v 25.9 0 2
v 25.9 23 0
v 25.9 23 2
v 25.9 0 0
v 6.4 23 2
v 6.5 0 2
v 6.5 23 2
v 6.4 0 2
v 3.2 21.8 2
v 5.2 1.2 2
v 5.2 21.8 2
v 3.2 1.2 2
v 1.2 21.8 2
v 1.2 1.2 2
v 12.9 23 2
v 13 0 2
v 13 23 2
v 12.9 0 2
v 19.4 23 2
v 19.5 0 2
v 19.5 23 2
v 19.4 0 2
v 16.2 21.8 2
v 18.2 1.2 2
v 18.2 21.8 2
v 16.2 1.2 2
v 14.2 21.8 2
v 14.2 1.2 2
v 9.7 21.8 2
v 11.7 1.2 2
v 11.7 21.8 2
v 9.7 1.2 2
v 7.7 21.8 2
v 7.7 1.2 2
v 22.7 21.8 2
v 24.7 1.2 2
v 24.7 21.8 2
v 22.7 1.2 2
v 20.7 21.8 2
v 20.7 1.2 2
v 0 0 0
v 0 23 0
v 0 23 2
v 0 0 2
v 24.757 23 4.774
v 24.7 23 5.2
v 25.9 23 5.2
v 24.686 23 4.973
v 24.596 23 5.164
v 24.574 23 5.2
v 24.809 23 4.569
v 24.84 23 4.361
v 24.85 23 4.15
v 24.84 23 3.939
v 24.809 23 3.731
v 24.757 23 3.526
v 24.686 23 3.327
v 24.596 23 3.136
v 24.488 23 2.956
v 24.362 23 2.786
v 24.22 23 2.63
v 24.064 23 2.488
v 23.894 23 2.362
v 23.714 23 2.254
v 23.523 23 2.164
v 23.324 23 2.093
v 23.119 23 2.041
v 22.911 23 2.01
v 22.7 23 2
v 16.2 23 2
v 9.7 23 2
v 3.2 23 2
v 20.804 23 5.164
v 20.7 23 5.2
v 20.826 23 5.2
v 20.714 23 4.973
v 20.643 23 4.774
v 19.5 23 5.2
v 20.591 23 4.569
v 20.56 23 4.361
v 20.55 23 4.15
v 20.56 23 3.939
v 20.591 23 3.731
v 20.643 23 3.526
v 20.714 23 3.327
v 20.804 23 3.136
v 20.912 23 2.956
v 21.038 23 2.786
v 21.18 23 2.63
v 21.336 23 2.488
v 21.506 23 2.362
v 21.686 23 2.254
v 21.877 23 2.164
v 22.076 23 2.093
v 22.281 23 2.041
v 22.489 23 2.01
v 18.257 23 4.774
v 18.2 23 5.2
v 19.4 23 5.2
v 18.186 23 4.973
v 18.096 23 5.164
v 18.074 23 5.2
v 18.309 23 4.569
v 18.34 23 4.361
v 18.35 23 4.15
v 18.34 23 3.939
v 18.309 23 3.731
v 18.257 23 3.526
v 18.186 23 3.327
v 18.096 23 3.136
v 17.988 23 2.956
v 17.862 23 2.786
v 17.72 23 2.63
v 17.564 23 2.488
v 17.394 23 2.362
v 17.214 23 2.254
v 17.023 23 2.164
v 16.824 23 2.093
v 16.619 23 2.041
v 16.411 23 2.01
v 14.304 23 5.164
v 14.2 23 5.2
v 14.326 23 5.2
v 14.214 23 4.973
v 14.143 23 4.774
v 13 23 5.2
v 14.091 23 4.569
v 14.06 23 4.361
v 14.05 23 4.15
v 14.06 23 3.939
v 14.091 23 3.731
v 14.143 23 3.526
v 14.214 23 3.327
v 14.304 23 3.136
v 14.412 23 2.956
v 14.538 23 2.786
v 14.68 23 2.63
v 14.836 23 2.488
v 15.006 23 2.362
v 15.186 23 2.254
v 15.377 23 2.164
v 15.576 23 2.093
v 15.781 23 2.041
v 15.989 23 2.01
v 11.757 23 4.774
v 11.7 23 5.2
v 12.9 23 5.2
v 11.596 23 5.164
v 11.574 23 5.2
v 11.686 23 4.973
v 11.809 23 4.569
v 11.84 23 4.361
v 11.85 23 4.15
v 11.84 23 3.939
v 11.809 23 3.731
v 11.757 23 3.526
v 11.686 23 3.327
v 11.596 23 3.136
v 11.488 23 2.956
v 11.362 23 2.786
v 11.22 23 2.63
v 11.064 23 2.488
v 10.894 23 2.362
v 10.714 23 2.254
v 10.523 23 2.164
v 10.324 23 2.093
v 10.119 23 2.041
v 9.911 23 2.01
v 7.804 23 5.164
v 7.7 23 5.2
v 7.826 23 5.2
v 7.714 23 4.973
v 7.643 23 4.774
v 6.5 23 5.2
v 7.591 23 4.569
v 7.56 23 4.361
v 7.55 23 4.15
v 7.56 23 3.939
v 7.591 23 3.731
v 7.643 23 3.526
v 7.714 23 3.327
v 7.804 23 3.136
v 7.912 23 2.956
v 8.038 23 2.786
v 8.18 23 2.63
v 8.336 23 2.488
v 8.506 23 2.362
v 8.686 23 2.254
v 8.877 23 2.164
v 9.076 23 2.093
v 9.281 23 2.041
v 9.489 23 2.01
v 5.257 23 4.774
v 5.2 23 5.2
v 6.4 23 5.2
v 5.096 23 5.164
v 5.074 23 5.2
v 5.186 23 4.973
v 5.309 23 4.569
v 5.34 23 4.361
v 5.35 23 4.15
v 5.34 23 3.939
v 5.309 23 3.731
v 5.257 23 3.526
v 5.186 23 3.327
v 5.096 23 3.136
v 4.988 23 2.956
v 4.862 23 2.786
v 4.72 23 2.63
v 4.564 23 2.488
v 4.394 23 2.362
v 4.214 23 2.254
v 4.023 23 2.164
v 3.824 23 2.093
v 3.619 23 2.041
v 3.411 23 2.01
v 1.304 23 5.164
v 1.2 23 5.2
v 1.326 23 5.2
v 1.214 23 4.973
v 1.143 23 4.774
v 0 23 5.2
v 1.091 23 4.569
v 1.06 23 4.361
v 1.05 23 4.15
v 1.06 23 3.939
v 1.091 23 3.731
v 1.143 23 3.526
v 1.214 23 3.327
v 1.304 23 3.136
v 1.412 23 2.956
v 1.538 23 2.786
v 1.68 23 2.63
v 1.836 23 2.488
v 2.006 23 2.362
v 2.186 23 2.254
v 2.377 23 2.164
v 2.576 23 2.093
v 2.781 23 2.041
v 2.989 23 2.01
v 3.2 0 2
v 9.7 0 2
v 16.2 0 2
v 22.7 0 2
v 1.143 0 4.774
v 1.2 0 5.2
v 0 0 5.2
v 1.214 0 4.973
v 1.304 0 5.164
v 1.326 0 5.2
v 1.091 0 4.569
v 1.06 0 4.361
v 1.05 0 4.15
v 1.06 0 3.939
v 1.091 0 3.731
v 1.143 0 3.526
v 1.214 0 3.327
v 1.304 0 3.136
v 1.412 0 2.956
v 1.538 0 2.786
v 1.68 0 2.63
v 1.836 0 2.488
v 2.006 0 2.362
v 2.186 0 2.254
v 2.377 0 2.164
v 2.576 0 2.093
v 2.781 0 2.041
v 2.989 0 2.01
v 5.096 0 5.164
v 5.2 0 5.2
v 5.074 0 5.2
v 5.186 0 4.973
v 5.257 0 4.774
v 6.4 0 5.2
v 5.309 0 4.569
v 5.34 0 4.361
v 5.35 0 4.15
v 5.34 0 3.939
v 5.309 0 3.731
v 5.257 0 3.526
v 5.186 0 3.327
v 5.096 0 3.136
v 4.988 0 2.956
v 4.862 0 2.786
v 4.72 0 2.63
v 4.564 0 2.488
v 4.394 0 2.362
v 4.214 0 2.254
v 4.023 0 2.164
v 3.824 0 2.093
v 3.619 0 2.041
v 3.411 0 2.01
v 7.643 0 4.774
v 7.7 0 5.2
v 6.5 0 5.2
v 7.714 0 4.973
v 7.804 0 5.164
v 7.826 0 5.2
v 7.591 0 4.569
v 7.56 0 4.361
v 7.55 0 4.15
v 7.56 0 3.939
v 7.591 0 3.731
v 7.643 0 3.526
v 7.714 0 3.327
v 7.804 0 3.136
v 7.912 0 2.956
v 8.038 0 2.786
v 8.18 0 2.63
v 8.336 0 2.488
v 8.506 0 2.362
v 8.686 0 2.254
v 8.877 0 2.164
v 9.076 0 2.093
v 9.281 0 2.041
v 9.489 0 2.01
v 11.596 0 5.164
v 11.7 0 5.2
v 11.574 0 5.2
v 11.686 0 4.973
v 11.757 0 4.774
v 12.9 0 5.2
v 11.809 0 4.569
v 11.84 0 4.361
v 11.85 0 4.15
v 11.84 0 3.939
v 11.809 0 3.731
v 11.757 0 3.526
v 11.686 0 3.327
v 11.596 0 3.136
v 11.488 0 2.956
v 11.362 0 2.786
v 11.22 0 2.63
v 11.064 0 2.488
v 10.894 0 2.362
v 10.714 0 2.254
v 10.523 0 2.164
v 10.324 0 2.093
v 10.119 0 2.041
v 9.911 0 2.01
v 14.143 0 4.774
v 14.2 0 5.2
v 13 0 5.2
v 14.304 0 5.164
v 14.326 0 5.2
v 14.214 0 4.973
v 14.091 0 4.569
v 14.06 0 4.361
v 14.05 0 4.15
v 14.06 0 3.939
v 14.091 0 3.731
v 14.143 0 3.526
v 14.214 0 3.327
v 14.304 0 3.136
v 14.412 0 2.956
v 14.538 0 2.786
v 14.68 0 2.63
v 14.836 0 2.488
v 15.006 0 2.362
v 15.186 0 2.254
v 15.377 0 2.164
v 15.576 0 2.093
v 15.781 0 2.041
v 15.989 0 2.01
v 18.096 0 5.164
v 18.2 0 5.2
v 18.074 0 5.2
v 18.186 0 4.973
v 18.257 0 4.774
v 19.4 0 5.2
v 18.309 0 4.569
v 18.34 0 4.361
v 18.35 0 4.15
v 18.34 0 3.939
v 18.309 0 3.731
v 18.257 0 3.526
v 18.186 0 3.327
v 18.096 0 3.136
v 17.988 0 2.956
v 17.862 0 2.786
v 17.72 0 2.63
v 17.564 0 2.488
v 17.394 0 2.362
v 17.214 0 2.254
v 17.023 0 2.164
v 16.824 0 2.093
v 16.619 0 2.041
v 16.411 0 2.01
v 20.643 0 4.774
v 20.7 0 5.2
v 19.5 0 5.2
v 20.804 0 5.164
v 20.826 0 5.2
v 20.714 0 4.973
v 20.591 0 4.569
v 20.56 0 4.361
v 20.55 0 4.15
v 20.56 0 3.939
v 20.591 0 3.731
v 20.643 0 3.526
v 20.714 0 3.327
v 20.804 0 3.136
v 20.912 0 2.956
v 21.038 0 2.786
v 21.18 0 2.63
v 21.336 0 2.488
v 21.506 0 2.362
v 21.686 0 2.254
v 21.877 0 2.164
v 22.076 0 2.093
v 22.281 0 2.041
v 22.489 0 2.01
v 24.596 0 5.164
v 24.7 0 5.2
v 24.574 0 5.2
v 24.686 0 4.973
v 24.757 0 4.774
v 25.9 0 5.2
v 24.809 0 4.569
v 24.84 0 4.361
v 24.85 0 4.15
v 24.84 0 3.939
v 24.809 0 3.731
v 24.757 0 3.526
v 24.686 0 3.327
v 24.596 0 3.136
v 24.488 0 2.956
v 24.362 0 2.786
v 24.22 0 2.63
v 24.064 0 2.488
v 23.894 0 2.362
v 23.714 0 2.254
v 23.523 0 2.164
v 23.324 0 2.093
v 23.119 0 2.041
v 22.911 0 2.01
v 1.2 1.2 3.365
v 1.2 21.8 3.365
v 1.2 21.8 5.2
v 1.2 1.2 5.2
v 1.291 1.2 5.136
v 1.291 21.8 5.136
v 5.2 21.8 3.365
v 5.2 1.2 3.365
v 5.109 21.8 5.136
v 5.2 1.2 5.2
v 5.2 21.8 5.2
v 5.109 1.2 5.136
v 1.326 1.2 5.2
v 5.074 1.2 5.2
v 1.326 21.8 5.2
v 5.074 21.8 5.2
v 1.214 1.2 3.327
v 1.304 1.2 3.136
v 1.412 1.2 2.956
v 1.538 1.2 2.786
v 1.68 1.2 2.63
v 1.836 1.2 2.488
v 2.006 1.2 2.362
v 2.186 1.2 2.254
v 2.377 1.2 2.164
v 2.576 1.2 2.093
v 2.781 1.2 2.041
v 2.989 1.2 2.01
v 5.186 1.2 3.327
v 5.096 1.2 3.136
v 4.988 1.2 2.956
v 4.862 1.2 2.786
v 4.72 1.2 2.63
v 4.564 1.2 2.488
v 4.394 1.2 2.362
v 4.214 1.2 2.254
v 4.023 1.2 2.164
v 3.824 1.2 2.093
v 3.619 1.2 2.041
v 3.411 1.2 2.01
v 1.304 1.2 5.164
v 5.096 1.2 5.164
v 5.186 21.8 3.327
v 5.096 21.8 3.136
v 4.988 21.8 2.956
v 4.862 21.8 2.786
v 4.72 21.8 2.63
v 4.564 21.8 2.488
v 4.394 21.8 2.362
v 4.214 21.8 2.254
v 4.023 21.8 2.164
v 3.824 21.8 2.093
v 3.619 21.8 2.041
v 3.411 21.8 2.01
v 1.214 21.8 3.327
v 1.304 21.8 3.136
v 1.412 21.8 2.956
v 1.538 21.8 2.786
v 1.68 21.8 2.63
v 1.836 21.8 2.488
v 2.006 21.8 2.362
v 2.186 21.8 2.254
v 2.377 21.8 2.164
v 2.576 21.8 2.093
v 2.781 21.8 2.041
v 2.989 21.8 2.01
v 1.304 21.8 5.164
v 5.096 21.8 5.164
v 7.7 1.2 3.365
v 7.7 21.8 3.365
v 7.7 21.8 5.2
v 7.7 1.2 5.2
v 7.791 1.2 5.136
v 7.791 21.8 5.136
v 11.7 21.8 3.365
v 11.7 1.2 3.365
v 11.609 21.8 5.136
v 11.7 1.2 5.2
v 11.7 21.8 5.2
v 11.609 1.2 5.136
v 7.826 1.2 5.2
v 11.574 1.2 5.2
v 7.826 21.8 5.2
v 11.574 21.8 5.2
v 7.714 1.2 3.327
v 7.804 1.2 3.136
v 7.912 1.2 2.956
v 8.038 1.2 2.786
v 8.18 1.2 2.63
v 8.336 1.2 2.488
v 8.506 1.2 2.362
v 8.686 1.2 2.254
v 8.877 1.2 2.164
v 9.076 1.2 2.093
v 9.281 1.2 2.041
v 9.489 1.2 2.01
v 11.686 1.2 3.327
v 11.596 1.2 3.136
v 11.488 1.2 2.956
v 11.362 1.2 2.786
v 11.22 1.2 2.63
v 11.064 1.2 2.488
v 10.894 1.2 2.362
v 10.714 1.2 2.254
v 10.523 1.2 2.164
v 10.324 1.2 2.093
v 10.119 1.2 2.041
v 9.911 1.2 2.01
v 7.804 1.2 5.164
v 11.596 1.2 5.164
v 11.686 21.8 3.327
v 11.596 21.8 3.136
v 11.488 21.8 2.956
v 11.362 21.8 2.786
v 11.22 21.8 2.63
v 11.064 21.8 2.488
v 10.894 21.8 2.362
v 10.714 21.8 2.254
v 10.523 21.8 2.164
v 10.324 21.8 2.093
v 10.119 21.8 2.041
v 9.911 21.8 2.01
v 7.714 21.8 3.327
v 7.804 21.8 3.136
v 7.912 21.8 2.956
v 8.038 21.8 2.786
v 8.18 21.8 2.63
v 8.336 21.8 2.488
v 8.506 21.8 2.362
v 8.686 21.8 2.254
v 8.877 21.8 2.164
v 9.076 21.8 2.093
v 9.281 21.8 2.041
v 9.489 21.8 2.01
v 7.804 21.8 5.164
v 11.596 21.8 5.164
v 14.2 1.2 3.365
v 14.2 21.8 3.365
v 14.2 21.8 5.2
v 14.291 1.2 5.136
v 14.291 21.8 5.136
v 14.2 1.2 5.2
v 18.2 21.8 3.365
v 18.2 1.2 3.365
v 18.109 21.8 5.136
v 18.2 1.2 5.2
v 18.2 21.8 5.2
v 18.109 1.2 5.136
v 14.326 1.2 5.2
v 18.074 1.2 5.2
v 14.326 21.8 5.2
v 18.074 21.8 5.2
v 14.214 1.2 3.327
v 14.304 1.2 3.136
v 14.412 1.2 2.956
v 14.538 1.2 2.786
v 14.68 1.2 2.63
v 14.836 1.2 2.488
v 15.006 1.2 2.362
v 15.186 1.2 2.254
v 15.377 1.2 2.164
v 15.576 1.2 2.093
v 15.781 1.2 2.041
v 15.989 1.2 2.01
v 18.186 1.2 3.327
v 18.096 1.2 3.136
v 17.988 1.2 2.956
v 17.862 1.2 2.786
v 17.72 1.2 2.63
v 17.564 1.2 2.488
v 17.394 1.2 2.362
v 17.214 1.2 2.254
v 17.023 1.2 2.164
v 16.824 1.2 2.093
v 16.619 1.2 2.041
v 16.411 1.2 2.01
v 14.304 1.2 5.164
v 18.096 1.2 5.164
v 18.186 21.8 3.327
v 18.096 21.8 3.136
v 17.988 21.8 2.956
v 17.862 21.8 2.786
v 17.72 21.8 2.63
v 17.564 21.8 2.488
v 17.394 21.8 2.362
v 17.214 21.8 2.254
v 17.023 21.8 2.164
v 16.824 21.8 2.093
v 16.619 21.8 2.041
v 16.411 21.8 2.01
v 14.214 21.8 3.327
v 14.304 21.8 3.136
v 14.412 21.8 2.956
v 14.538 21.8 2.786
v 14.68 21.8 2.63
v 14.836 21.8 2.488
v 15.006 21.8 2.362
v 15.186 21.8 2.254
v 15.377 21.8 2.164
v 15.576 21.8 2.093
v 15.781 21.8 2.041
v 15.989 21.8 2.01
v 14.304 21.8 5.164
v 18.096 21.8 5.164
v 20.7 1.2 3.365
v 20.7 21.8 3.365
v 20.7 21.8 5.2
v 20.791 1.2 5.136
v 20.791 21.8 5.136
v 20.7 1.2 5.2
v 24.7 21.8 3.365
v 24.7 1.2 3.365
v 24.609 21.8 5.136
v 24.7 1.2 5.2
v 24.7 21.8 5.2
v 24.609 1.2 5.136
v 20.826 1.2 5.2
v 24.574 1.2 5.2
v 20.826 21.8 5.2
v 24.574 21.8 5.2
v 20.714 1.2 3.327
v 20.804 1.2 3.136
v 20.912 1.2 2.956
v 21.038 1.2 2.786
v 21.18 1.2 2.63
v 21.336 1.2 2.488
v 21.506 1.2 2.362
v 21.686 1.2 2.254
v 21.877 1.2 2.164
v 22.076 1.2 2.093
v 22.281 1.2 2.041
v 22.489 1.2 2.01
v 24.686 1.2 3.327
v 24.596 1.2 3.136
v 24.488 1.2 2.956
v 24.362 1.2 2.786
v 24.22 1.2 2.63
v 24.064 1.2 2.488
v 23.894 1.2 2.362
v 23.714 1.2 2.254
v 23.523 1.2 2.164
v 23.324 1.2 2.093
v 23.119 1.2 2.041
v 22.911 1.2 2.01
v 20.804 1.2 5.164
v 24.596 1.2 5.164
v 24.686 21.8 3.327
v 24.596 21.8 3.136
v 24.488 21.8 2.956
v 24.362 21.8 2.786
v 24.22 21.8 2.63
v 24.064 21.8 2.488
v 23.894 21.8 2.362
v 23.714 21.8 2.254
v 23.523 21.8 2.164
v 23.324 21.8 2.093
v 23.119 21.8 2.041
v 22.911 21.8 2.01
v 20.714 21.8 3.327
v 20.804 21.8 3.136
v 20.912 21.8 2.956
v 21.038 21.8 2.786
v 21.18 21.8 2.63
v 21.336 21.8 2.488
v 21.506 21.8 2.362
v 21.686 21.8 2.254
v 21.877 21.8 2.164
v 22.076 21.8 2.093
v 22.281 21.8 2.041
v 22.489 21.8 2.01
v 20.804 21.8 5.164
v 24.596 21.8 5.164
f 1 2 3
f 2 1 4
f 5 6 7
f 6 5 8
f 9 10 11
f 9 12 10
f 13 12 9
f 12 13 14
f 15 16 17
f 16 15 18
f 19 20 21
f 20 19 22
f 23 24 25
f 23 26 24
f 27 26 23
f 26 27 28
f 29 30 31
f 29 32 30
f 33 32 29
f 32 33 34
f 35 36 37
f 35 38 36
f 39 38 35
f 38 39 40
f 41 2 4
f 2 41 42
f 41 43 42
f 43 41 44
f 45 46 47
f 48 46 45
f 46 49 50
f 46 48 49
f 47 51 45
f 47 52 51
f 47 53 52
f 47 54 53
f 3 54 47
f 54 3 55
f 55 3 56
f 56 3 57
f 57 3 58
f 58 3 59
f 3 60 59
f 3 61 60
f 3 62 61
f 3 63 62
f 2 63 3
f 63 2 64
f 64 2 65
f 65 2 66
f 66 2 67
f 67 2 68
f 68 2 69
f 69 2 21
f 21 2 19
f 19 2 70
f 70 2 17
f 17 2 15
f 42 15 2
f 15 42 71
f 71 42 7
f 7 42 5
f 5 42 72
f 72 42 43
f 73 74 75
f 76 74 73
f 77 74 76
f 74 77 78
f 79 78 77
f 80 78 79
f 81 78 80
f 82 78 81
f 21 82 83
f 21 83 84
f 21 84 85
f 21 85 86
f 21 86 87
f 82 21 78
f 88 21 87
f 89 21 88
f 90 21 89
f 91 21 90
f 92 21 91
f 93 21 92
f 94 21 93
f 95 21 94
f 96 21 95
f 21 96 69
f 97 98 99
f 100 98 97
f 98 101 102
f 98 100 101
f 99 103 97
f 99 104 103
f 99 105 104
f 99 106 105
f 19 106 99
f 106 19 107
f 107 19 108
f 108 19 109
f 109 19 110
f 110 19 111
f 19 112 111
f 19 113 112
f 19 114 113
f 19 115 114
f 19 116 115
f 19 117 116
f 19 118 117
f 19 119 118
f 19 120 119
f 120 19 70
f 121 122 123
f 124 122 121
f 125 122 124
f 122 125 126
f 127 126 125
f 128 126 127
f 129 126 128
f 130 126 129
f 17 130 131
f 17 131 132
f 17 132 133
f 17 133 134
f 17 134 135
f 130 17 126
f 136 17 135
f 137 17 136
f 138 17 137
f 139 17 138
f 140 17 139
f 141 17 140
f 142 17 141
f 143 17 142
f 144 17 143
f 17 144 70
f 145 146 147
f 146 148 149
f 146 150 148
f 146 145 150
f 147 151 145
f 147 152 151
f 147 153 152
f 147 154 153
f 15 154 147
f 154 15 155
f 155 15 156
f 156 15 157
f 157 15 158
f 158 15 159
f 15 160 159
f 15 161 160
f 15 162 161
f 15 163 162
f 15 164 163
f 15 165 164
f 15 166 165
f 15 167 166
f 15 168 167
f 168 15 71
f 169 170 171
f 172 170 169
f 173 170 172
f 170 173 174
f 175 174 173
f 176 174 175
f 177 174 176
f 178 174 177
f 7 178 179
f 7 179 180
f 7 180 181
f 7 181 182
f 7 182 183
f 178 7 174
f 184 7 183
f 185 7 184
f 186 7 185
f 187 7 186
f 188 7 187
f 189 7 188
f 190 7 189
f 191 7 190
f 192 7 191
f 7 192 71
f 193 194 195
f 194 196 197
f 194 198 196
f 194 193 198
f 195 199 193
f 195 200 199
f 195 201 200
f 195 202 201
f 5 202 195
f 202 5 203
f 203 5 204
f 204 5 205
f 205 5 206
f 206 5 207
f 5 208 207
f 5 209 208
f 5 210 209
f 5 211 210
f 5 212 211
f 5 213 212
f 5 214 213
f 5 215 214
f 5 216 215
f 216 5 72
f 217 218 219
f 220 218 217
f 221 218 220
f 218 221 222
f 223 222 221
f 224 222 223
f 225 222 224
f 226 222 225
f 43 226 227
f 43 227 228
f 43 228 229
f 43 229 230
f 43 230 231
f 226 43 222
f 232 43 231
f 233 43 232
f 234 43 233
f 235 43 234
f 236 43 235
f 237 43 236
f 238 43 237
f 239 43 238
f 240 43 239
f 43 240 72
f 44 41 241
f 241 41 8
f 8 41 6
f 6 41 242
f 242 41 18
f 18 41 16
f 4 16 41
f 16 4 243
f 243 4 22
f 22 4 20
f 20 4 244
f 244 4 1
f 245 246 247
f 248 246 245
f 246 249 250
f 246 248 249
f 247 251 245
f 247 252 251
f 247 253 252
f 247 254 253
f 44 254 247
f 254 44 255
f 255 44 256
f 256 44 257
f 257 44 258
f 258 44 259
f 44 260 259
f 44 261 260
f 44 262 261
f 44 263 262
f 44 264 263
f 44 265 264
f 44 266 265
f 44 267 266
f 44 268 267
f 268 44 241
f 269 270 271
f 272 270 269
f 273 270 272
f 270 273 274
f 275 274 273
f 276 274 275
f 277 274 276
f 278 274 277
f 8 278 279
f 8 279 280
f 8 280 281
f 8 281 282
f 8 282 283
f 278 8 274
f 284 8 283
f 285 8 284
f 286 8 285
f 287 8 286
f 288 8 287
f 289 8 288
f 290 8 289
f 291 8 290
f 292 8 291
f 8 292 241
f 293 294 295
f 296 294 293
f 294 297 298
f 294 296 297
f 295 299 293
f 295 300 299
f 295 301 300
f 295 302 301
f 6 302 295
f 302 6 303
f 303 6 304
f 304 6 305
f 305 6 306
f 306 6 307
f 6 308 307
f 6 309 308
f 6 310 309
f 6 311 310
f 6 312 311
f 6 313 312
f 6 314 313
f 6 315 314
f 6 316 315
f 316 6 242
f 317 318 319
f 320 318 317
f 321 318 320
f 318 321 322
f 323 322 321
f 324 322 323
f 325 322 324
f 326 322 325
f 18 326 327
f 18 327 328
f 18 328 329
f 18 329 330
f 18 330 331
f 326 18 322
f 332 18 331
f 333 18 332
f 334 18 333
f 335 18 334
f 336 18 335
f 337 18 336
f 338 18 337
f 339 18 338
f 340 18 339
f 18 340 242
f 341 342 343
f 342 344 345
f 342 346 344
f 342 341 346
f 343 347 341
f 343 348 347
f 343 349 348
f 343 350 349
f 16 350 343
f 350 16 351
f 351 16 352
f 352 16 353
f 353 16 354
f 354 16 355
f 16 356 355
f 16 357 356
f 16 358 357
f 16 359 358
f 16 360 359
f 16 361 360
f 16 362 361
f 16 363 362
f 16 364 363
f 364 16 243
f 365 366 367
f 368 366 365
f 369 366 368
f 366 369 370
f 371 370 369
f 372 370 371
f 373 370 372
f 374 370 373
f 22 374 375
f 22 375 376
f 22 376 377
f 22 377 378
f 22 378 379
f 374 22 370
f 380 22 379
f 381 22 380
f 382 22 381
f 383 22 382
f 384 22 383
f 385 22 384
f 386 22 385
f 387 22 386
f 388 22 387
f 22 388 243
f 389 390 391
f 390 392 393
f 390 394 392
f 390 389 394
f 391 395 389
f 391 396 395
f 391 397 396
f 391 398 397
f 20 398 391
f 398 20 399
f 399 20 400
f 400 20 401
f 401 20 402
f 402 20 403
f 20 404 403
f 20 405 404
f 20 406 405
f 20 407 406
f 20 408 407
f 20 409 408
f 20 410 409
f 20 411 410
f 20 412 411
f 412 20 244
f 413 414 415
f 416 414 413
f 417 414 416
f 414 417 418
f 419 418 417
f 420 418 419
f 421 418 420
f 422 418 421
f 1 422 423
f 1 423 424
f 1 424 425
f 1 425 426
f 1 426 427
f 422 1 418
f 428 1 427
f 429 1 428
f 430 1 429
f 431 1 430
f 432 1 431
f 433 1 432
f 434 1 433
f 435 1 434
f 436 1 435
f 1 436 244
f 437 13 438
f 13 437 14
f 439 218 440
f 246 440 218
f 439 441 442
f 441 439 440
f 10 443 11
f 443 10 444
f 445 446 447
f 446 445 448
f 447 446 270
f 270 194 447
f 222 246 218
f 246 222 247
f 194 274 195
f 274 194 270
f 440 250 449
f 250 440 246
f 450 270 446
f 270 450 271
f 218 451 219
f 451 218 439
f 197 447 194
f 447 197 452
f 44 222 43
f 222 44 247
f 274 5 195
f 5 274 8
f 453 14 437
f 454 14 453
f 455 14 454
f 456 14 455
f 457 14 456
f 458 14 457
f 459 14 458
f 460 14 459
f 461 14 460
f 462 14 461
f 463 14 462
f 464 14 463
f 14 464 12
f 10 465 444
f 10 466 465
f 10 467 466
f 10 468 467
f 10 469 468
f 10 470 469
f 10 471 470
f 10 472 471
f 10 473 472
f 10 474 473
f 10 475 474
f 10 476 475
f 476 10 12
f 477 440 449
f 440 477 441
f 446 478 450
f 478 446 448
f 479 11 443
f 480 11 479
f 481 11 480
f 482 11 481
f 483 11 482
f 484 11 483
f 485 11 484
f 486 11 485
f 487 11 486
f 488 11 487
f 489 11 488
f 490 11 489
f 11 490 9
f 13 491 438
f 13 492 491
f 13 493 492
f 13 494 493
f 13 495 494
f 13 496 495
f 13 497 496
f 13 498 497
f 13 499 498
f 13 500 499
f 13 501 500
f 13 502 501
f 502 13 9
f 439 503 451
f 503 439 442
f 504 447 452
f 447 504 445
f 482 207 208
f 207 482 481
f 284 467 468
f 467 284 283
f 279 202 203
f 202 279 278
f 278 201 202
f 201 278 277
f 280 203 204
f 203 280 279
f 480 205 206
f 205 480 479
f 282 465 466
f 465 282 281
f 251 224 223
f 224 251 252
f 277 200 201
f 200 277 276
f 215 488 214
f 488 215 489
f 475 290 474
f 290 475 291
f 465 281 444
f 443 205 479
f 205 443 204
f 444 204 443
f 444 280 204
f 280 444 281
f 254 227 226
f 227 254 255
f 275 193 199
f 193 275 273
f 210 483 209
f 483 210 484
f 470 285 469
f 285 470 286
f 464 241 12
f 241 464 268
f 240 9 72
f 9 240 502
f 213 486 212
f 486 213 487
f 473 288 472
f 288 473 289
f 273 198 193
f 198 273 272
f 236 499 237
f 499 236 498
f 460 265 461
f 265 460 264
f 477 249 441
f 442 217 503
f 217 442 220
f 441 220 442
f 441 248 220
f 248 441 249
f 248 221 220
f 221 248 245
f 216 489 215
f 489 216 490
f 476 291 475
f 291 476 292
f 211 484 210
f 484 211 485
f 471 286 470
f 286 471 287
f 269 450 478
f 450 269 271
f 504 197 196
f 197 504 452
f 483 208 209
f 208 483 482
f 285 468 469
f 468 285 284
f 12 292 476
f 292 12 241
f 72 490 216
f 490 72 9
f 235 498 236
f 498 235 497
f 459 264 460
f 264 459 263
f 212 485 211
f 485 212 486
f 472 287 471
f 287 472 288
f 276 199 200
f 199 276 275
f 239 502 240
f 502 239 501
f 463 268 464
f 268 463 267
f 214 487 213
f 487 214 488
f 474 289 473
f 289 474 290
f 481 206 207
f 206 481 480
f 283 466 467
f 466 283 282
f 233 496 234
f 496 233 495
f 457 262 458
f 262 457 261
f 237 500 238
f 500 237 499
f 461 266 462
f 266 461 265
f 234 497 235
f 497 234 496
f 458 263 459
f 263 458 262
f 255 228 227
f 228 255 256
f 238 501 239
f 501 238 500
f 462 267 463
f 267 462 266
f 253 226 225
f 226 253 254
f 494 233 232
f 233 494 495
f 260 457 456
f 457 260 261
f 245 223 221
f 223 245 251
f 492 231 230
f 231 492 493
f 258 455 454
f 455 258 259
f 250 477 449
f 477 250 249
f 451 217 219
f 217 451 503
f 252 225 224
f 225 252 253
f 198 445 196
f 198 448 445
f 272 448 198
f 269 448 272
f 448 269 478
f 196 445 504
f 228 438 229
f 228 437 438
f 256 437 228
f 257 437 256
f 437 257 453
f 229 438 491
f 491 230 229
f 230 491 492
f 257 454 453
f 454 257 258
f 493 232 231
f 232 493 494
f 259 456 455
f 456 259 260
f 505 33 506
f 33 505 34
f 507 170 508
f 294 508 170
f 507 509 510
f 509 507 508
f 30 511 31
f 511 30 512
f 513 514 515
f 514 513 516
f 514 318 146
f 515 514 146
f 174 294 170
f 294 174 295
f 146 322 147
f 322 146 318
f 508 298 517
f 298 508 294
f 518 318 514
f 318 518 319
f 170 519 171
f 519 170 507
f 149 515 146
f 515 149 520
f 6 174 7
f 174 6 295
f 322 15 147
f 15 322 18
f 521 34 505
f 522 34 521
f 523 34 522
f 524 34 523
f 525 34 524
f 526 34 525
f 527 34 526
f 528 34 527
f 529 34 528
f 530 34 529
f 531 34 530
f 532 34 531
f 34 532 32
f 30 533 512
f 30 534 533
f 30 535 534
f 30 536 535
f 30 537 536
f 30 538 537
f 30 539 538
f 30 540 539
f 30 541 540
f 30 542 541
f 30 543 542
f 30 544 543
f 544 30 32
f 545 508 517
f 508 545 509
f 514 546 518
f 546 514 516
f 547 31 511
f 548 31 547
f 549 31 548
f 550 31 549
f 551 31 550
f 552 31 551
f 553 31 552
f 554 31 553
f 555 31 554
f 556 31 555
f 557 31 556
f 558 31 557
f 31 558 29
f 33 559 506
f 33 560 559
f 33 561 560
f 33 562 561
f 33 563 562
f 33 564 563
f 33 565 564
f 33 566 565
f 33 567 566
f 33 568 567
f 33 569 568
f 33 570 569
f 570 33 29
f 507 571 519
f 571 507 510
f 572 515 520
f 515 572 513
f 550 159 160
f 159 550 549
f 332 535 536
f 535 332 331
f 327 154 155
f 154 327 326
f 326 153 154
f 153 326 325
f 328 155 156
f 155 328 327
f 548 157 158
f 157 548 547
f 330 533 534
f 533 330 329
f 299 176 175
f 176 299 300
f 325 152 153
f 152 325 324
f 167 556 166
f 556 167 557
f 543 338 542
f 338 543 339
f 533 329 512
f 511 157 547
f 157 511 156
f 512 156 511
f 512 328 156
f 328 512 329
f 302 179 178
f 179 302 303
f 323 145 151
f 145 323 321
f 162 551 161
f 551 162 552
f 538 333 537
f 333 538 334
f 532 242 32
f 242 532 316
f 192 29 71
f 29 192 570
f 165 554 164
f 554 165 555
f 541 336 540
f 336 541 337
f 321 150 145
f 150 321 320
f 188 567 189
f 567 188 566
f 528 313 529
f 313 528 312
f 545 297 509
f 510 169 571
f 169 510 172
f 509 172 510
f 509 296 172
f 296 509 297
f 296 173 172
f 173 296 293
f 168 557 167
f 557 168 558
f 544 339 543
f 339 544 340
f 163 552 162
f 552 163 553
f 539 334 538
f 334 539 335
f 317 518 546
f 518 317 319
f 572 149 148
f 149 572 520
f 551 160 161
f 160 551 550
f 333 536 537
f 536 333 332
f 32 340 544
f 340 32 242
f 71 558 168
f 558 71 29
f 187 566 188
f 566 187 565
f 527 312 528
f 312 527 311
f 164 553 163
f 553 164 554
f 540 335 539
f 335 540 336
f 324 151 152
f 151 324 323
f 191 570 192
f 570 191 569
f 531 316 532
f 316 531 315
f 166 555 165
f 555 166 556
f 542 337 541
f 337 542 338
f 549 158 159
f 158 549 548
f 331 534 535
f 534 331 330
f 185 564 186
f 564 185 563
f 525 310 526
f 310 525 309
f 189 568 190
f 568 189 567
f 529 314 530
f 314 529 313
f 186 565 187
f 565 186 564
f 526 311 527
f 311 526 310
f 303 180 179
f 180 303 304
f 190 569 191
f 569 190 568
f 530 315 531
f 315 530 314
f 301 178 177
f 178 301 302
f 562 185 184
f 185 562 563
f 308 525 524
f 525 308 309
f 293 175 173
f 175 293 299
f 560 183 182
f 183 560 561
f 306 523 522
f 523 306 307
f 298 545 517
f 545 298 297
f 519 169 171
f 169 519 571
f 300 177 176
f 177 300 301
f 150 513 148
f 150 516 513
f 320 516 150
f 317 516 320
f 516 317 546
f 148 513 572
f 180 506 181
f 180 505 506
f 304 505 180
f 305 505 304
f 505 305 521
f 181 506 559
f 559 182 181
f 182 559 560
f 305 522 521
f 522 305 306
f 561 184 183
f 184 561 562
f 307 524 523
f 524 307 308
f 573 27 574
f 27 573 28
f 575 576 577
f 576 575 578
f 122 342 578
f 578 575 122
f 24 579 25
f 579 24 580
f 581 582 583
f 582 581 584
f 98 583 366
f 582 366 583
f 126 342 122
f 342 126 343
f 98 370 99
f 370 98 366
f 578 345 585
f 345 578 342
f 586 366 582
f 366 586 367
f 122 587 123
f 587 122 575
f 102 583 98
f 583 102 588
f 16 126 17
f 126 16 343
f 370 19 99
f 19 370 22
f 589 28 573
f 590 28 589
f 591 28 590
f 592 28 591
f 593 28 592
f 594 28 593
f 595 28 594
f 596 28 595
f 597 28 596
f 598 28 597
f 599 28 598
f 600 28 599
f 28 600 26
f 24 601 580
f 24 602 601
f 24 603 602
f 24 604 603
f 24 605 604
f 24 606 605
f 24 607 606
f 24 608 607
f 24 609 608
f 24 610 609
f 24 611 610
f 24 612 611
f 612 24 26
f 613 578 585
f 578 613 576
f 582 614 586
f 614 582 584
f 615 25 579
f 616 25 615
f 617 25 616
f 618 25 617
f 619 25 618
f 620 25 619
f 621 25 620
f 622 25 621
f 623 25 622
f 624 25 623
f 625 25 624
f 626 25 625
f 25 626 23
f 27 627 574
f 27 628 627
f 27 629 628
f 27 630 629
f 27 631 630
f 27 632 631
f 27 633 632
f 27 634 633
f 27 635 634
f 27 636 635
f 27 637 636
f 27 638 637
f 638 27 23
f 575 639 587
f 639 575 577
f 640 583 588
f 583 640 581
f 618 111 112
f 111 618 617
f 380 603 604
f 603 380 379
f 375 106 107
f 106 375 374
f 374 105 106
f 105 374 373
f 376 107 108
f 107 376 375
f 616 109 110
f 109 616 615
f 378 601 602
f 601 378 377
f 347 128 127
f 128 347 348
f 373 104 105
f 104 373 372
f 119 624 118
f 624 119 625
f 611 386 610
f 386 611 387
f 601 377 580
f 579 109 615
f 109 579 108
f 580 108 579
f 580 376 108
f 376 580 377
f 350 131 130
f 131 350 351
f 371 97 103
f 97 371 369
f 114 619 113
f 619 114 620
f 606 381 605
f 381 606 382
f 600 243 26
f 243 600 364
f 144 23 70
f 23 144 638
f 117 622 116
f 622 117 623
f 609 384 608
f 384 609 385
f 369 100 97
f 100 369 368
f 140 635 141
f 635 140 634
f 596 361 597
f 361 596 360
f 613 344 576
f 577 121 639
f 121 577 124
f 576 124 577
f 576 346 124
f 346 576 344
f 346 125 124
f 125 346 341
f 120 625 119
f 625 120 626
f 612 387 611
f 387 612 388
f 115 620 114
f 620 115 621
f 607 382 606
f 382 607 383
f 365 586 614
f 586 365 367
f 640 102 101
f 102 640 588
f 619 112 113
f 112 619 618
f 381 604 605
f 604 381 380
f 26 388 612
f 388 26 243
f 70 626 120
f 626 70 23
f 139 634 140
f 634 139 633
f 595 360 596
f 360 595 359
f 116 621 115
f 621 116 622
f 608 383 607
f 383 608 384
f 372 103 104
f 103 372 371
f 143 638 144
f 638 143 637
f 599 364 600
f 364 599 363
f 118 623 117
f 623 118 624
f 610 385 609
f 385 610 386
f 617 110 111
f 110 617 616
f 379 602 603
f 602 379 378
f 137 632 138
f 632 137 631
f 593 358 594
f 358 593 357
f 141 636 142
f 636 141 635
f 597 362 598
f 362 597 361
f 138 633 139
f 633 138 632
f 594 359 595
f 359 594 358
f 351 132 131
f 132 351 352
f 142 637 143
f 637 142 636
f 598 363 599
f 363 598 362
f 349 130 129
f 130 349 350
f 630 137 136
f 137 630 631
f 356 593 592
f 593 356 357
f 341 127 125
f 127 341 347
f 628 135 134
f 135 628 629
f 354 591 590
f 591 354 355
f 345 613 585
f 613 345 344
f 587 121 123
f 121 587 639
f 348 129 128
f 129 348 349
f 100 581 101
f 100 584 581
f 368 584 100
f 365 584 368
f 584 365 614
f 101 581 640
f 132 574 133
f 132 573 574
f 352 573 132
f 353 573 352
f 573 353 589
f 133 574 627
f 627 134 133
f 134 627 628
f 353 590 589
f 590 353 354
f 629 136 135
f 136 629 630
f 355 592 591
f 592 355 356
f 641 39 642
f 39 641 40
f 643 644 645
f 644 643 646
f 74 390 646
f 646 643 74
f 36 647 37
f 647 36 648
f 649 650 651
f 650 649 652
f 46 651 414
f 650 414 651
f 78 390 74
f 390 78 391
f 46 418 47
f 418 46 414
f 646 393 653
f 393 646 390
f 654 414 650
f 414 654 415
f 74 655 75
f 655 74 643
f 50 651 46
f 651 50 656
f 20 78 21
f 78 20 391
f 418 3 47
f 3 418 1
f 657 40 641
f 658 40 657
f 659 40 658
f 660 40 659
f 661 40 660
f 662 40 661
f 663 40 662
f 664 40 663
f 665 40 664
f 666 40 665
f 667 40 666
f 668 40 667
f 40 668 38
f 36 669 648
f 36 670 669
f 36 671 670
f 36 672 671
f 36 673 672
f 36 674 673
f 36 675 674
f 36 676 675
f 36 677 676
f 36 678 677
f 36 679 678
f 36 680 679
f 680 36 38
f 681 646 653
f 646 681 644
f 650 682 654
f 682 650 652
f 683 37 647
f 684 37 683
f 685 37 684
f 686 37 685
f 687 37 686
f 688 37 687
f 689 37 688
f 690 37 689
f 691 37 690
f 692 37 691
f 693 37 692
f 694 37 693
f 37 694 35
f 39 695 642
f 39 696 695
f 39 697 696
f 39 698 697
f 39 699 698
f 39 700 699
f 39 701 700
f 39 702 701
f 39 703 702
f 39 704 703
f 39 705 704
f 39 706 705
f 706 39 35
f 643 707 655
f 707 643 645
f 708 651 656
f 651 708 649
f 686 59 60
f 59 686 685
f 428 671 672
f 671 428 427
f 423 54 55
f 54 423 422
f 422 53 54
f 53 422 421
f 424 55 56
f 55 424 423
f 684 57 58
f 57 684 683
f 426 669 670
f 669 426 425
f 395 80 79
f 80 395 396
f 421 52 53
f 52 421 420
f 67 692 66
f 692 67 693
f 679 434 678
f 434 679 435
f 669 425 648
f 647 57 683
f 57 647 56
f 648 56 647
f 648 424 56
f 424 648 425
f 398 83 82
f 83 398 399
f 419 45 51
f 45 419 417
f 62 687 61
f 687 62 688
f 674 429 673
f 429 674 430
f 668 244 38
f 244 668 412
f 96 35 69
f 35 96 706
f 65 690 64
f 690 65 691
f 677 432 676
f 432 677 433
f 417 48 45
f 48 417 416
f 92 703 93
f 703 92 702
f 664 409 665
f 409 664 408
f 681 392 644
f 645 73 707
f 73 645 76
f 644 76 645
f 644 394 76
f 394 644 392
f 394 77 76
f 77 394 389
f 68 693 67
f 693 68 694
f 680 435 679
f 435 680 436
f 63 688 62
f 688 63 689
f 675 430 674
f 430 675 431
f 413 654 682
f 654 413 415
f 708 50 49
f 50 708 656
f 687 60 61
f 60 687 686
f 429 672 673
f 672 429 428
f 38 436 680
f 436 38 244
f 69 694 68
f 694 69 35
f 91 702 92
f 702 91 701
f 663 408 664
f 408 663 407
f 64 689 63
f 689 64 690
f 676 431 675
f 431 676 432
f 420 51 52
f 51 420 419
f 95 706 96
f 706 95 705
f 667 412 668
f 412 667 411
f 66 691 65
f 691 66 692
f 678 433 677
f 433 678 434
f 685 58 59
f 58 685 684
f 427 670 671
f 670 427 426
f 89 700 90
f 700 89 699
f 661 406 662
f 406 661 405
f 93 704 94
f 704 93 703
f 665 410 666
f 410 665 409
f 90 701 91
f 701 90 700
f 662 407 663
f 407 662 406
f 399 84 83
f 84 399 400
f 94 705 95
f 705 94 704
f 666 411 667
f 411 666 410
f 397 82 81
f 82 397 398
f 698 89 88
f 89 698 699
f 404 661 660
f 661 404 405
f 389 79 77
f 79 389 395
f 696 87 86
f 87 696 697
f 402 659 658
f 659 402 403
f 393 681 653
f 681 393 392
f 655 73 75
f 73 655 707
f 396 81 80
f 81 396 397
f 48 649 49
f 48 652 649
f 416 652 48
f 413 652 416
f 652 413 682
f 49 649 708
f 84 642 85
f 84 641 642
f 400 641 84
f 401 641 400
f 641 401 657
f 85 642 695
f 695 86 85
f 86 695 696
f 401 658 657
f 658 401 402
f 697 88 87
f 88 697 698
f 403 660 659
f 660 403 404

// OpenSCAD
// Parametric Tubing Clip - Snap-Fit Design
// Supports PTFE (3mm OD x 1.5mm ID) and Silicone tubing
// Based on VC Design's cable clip concept

/* [Tubing Type] */
tubing_type = "ptfe"; // [ptfe:PTFE (3mm OD x 1.5mm ID), silicone:Silicone (3mm OD)]

/* [Tubing Parameters] */
num_tubes = 4;           // Number of tubes to hold
tube_spacing = 6.5;      // Spacing between tube centers (mm)

/* [Clip Dimensions] */
clip_length = 23;        // Overall length of clip (mm)
wall_thickness = 1.2;    // Wall thickness (mm)
base_thickness = 2.0;    // Base plate thickness (mm)

/* [Mounting] */
screw_diameter = 3.0;    // Mounting screw diameter (mm)
screw_head_dia = 6.0;    // Screw head diameter (mm)
countersink = true;      // Use countersunk mounting holes

/* [Print Settings] */
$fn = 64;                // Circle resolution

// Tubing type specific parameters
// PTFE: Stiffer material, needs more clearance, thinner walls
// Silicone: Flexible, compresses slightly, thicker walls
tube_od = (tubing_type == "ptfe") ? 4.0 : 3.0;
tube_id = (tubing_type == "ptfe") ? 2 : 1.5;
channel_clearance = (tubing_type == "ptfe") ? 0.3 : 0.1;  // PTFE needs more clearance (stiffer)
grip_interference = (tubing_type == "ptfe") ? 0.2 : 0.4;  // Silicone can compress more

// Effective channel diameter (tube OD + clearance)
channel_diameter = tube_od + channel_clearance;

// Calculated dimensions
total_width = (num_tubes - 1) * tube_spacing + tube_od + 2 * wall_thickness;
channel_depth = tube_od / 2 + wall_thickness;
clip_height = base_thickness + channel_depth;

// Snap-in opening parameters
// PTFE: Wider opening since tube won't compress
// Silicone: Can use tighter opening
snap_opening = (tubing_type == "ptfe") ? tube_od * 0.85 : tube_od * 0.7;

// Main assembly
module tubing_clip_assembly() {
    base_plate();
    translate([0, 0, base_thickness])
        tube_channels();
}

module base_plate() {
    difference() {
        // Main base
        cube([total_width, clip_length, base_thickness]);

        // Mounting holes
        for (pos = [clip_length * 0.25, clip_length * 0.75]) {
            translate([total_width / 2, pos, -0.1]) {
		/*
                if (countersink) {
                    cylinder(d=screw_diameter, h=base_thickness + 0.2);
                    translate([0, 0, base_thickness - screw_head_dia/2 + 0.5])
                        cylinder(d1=screw_diameter, d2=screw_head_dia, h=screw_head_dia/2);
                } else {
                    cylinder(d=screw_diameter, h=base_thickness + 0.2);
                }
		*/

            }
        }
    }
}

module tube_channels() {
    for (i = [0:num_tubes-1]) {
        x_pos = wall_thickness + tube_od/2 + i * tube_spacing;
        translate([x_pos, 0, 0])
            single_channel();
    }
}

module single_channel() {
    difference() {
        union() {
            // Side walls with snap-in lips
            translate([-tube_od/2 - wall_thickness, 0, 0])
                cube([wall_thickness, clip_length, channel_depth]);
            translate([tube_od/2, 0, 0])
                cube([wall_thickness, clip_length, channel_depth]);

            // Back wall
            translate([-tube_od/2 - wall_thickness, 0, 0])
                cube([tube_od + 2*wall_thickness, wall_thickness, channel_depth]);

            // Front wall
            translate([-tube_od/2 - wall_thickness, clip_length - wall_thickness, 0])
                cube([tube_od + 2*wall_thickness, wall_thickness, channel_depth]);

            // Snap-in lips (grip the tube from above)
            lip_height = channel_depth;
            lip_width = (tube_od - snap_opening) / 2 + grip_interference;

            // Left lip
            translate([-tube_od/2, 0, channel_depth - lip_width])
                snap_lip(lip_width, clip_length);

            // Right lip (mirrored)
            translate([tube_od/2, 0, channel_depth - lip_width])
                mirror([1, 0, 0])
                    snap_lip(lip_width, clip_length);
        }

        // Tube channel cutout (semicircular)
        translate([0, -0.1, channel_diameter/2])
            rotate([-90, 0, 0])
                cylinder(d=channel_diameter, h=clip_length + 0.2);
    }
}

// Snap lip with angled entry for easy tube insertion
module snap_lip(width, length) {
    entry_angle = (tubing_type == "ptfe") ? 35 : 45;  // PTFE needs gentler angle

    difference() {
        cube([width, length, width]);

        // Angled entry chamfer
        translate([0, -0.1, width])
            rotate([0, entry_angle, 0])
                cube([width * 2, length + 0.2, width]);
    }
}

// Render for printing
module render_for_print() {
    tubing_clip_assembly();
}

// Visualization with tubes inserted
module render_with_tubes() {
    tubing_clip_assembly();

    // Show tubes in position
    color("white", 0.6)
        for (i = [0:num_tubes-1]) {
            x_pos = wall_thickness + tube_od/2 + i * tube_spacing;
            translate([x_pos, -5, base_thickness + channel_diameter/2])
                rotate([-90, 0, 0])
                    difference() {
                        cylinder(d=tube_od, h=clip_length + 10);
                        cylinder(d=tube_id, h=clip_length + 10.1);
                    }
        }
}

// Cross-section view
module render_cross_section() {
    difference() {
        render_with_tubes();

        // Cut away front half
        translate([-10, clip_length/2, -10])
            cube([total_width + 20, clip_length, clip_height + 20]);
    }
}

// Info text for console
echo(str("=== Tubing Clip Configuration ==="));
echo(str("Tubing type: ", tubing_type));
echo(str("Tube OD: ", tube_od, "mm, ID: ", tube_id, "mm"));
echo(str("Channel diameter: ", channel_diameter, "mm (includes ", channel_clearance, "mm clearance)"));
echo(str("Snap opening: ", snap_opening, "mm"));
echo(str("Number of tubes: ", num_tubes));
echo(str("Total width: ", total_width, "mm"));
echo(str("Clip dimensions: ", total_width, " x ", clip_length, " x ", clip_height, "mm"));

/* [Render Mode] */
render_mode = "print"; // [print:Print Layout, with_tubes:With Tubes, cross_section:Cross Section]

// Render based on mode
if (render_mode == "print") {
    render_for_print();
} else if (render_mode == "with_tubes") {
    render_with_tubes();
} else if (render_mode == "cross_section") {
    render_cross_section();
}
